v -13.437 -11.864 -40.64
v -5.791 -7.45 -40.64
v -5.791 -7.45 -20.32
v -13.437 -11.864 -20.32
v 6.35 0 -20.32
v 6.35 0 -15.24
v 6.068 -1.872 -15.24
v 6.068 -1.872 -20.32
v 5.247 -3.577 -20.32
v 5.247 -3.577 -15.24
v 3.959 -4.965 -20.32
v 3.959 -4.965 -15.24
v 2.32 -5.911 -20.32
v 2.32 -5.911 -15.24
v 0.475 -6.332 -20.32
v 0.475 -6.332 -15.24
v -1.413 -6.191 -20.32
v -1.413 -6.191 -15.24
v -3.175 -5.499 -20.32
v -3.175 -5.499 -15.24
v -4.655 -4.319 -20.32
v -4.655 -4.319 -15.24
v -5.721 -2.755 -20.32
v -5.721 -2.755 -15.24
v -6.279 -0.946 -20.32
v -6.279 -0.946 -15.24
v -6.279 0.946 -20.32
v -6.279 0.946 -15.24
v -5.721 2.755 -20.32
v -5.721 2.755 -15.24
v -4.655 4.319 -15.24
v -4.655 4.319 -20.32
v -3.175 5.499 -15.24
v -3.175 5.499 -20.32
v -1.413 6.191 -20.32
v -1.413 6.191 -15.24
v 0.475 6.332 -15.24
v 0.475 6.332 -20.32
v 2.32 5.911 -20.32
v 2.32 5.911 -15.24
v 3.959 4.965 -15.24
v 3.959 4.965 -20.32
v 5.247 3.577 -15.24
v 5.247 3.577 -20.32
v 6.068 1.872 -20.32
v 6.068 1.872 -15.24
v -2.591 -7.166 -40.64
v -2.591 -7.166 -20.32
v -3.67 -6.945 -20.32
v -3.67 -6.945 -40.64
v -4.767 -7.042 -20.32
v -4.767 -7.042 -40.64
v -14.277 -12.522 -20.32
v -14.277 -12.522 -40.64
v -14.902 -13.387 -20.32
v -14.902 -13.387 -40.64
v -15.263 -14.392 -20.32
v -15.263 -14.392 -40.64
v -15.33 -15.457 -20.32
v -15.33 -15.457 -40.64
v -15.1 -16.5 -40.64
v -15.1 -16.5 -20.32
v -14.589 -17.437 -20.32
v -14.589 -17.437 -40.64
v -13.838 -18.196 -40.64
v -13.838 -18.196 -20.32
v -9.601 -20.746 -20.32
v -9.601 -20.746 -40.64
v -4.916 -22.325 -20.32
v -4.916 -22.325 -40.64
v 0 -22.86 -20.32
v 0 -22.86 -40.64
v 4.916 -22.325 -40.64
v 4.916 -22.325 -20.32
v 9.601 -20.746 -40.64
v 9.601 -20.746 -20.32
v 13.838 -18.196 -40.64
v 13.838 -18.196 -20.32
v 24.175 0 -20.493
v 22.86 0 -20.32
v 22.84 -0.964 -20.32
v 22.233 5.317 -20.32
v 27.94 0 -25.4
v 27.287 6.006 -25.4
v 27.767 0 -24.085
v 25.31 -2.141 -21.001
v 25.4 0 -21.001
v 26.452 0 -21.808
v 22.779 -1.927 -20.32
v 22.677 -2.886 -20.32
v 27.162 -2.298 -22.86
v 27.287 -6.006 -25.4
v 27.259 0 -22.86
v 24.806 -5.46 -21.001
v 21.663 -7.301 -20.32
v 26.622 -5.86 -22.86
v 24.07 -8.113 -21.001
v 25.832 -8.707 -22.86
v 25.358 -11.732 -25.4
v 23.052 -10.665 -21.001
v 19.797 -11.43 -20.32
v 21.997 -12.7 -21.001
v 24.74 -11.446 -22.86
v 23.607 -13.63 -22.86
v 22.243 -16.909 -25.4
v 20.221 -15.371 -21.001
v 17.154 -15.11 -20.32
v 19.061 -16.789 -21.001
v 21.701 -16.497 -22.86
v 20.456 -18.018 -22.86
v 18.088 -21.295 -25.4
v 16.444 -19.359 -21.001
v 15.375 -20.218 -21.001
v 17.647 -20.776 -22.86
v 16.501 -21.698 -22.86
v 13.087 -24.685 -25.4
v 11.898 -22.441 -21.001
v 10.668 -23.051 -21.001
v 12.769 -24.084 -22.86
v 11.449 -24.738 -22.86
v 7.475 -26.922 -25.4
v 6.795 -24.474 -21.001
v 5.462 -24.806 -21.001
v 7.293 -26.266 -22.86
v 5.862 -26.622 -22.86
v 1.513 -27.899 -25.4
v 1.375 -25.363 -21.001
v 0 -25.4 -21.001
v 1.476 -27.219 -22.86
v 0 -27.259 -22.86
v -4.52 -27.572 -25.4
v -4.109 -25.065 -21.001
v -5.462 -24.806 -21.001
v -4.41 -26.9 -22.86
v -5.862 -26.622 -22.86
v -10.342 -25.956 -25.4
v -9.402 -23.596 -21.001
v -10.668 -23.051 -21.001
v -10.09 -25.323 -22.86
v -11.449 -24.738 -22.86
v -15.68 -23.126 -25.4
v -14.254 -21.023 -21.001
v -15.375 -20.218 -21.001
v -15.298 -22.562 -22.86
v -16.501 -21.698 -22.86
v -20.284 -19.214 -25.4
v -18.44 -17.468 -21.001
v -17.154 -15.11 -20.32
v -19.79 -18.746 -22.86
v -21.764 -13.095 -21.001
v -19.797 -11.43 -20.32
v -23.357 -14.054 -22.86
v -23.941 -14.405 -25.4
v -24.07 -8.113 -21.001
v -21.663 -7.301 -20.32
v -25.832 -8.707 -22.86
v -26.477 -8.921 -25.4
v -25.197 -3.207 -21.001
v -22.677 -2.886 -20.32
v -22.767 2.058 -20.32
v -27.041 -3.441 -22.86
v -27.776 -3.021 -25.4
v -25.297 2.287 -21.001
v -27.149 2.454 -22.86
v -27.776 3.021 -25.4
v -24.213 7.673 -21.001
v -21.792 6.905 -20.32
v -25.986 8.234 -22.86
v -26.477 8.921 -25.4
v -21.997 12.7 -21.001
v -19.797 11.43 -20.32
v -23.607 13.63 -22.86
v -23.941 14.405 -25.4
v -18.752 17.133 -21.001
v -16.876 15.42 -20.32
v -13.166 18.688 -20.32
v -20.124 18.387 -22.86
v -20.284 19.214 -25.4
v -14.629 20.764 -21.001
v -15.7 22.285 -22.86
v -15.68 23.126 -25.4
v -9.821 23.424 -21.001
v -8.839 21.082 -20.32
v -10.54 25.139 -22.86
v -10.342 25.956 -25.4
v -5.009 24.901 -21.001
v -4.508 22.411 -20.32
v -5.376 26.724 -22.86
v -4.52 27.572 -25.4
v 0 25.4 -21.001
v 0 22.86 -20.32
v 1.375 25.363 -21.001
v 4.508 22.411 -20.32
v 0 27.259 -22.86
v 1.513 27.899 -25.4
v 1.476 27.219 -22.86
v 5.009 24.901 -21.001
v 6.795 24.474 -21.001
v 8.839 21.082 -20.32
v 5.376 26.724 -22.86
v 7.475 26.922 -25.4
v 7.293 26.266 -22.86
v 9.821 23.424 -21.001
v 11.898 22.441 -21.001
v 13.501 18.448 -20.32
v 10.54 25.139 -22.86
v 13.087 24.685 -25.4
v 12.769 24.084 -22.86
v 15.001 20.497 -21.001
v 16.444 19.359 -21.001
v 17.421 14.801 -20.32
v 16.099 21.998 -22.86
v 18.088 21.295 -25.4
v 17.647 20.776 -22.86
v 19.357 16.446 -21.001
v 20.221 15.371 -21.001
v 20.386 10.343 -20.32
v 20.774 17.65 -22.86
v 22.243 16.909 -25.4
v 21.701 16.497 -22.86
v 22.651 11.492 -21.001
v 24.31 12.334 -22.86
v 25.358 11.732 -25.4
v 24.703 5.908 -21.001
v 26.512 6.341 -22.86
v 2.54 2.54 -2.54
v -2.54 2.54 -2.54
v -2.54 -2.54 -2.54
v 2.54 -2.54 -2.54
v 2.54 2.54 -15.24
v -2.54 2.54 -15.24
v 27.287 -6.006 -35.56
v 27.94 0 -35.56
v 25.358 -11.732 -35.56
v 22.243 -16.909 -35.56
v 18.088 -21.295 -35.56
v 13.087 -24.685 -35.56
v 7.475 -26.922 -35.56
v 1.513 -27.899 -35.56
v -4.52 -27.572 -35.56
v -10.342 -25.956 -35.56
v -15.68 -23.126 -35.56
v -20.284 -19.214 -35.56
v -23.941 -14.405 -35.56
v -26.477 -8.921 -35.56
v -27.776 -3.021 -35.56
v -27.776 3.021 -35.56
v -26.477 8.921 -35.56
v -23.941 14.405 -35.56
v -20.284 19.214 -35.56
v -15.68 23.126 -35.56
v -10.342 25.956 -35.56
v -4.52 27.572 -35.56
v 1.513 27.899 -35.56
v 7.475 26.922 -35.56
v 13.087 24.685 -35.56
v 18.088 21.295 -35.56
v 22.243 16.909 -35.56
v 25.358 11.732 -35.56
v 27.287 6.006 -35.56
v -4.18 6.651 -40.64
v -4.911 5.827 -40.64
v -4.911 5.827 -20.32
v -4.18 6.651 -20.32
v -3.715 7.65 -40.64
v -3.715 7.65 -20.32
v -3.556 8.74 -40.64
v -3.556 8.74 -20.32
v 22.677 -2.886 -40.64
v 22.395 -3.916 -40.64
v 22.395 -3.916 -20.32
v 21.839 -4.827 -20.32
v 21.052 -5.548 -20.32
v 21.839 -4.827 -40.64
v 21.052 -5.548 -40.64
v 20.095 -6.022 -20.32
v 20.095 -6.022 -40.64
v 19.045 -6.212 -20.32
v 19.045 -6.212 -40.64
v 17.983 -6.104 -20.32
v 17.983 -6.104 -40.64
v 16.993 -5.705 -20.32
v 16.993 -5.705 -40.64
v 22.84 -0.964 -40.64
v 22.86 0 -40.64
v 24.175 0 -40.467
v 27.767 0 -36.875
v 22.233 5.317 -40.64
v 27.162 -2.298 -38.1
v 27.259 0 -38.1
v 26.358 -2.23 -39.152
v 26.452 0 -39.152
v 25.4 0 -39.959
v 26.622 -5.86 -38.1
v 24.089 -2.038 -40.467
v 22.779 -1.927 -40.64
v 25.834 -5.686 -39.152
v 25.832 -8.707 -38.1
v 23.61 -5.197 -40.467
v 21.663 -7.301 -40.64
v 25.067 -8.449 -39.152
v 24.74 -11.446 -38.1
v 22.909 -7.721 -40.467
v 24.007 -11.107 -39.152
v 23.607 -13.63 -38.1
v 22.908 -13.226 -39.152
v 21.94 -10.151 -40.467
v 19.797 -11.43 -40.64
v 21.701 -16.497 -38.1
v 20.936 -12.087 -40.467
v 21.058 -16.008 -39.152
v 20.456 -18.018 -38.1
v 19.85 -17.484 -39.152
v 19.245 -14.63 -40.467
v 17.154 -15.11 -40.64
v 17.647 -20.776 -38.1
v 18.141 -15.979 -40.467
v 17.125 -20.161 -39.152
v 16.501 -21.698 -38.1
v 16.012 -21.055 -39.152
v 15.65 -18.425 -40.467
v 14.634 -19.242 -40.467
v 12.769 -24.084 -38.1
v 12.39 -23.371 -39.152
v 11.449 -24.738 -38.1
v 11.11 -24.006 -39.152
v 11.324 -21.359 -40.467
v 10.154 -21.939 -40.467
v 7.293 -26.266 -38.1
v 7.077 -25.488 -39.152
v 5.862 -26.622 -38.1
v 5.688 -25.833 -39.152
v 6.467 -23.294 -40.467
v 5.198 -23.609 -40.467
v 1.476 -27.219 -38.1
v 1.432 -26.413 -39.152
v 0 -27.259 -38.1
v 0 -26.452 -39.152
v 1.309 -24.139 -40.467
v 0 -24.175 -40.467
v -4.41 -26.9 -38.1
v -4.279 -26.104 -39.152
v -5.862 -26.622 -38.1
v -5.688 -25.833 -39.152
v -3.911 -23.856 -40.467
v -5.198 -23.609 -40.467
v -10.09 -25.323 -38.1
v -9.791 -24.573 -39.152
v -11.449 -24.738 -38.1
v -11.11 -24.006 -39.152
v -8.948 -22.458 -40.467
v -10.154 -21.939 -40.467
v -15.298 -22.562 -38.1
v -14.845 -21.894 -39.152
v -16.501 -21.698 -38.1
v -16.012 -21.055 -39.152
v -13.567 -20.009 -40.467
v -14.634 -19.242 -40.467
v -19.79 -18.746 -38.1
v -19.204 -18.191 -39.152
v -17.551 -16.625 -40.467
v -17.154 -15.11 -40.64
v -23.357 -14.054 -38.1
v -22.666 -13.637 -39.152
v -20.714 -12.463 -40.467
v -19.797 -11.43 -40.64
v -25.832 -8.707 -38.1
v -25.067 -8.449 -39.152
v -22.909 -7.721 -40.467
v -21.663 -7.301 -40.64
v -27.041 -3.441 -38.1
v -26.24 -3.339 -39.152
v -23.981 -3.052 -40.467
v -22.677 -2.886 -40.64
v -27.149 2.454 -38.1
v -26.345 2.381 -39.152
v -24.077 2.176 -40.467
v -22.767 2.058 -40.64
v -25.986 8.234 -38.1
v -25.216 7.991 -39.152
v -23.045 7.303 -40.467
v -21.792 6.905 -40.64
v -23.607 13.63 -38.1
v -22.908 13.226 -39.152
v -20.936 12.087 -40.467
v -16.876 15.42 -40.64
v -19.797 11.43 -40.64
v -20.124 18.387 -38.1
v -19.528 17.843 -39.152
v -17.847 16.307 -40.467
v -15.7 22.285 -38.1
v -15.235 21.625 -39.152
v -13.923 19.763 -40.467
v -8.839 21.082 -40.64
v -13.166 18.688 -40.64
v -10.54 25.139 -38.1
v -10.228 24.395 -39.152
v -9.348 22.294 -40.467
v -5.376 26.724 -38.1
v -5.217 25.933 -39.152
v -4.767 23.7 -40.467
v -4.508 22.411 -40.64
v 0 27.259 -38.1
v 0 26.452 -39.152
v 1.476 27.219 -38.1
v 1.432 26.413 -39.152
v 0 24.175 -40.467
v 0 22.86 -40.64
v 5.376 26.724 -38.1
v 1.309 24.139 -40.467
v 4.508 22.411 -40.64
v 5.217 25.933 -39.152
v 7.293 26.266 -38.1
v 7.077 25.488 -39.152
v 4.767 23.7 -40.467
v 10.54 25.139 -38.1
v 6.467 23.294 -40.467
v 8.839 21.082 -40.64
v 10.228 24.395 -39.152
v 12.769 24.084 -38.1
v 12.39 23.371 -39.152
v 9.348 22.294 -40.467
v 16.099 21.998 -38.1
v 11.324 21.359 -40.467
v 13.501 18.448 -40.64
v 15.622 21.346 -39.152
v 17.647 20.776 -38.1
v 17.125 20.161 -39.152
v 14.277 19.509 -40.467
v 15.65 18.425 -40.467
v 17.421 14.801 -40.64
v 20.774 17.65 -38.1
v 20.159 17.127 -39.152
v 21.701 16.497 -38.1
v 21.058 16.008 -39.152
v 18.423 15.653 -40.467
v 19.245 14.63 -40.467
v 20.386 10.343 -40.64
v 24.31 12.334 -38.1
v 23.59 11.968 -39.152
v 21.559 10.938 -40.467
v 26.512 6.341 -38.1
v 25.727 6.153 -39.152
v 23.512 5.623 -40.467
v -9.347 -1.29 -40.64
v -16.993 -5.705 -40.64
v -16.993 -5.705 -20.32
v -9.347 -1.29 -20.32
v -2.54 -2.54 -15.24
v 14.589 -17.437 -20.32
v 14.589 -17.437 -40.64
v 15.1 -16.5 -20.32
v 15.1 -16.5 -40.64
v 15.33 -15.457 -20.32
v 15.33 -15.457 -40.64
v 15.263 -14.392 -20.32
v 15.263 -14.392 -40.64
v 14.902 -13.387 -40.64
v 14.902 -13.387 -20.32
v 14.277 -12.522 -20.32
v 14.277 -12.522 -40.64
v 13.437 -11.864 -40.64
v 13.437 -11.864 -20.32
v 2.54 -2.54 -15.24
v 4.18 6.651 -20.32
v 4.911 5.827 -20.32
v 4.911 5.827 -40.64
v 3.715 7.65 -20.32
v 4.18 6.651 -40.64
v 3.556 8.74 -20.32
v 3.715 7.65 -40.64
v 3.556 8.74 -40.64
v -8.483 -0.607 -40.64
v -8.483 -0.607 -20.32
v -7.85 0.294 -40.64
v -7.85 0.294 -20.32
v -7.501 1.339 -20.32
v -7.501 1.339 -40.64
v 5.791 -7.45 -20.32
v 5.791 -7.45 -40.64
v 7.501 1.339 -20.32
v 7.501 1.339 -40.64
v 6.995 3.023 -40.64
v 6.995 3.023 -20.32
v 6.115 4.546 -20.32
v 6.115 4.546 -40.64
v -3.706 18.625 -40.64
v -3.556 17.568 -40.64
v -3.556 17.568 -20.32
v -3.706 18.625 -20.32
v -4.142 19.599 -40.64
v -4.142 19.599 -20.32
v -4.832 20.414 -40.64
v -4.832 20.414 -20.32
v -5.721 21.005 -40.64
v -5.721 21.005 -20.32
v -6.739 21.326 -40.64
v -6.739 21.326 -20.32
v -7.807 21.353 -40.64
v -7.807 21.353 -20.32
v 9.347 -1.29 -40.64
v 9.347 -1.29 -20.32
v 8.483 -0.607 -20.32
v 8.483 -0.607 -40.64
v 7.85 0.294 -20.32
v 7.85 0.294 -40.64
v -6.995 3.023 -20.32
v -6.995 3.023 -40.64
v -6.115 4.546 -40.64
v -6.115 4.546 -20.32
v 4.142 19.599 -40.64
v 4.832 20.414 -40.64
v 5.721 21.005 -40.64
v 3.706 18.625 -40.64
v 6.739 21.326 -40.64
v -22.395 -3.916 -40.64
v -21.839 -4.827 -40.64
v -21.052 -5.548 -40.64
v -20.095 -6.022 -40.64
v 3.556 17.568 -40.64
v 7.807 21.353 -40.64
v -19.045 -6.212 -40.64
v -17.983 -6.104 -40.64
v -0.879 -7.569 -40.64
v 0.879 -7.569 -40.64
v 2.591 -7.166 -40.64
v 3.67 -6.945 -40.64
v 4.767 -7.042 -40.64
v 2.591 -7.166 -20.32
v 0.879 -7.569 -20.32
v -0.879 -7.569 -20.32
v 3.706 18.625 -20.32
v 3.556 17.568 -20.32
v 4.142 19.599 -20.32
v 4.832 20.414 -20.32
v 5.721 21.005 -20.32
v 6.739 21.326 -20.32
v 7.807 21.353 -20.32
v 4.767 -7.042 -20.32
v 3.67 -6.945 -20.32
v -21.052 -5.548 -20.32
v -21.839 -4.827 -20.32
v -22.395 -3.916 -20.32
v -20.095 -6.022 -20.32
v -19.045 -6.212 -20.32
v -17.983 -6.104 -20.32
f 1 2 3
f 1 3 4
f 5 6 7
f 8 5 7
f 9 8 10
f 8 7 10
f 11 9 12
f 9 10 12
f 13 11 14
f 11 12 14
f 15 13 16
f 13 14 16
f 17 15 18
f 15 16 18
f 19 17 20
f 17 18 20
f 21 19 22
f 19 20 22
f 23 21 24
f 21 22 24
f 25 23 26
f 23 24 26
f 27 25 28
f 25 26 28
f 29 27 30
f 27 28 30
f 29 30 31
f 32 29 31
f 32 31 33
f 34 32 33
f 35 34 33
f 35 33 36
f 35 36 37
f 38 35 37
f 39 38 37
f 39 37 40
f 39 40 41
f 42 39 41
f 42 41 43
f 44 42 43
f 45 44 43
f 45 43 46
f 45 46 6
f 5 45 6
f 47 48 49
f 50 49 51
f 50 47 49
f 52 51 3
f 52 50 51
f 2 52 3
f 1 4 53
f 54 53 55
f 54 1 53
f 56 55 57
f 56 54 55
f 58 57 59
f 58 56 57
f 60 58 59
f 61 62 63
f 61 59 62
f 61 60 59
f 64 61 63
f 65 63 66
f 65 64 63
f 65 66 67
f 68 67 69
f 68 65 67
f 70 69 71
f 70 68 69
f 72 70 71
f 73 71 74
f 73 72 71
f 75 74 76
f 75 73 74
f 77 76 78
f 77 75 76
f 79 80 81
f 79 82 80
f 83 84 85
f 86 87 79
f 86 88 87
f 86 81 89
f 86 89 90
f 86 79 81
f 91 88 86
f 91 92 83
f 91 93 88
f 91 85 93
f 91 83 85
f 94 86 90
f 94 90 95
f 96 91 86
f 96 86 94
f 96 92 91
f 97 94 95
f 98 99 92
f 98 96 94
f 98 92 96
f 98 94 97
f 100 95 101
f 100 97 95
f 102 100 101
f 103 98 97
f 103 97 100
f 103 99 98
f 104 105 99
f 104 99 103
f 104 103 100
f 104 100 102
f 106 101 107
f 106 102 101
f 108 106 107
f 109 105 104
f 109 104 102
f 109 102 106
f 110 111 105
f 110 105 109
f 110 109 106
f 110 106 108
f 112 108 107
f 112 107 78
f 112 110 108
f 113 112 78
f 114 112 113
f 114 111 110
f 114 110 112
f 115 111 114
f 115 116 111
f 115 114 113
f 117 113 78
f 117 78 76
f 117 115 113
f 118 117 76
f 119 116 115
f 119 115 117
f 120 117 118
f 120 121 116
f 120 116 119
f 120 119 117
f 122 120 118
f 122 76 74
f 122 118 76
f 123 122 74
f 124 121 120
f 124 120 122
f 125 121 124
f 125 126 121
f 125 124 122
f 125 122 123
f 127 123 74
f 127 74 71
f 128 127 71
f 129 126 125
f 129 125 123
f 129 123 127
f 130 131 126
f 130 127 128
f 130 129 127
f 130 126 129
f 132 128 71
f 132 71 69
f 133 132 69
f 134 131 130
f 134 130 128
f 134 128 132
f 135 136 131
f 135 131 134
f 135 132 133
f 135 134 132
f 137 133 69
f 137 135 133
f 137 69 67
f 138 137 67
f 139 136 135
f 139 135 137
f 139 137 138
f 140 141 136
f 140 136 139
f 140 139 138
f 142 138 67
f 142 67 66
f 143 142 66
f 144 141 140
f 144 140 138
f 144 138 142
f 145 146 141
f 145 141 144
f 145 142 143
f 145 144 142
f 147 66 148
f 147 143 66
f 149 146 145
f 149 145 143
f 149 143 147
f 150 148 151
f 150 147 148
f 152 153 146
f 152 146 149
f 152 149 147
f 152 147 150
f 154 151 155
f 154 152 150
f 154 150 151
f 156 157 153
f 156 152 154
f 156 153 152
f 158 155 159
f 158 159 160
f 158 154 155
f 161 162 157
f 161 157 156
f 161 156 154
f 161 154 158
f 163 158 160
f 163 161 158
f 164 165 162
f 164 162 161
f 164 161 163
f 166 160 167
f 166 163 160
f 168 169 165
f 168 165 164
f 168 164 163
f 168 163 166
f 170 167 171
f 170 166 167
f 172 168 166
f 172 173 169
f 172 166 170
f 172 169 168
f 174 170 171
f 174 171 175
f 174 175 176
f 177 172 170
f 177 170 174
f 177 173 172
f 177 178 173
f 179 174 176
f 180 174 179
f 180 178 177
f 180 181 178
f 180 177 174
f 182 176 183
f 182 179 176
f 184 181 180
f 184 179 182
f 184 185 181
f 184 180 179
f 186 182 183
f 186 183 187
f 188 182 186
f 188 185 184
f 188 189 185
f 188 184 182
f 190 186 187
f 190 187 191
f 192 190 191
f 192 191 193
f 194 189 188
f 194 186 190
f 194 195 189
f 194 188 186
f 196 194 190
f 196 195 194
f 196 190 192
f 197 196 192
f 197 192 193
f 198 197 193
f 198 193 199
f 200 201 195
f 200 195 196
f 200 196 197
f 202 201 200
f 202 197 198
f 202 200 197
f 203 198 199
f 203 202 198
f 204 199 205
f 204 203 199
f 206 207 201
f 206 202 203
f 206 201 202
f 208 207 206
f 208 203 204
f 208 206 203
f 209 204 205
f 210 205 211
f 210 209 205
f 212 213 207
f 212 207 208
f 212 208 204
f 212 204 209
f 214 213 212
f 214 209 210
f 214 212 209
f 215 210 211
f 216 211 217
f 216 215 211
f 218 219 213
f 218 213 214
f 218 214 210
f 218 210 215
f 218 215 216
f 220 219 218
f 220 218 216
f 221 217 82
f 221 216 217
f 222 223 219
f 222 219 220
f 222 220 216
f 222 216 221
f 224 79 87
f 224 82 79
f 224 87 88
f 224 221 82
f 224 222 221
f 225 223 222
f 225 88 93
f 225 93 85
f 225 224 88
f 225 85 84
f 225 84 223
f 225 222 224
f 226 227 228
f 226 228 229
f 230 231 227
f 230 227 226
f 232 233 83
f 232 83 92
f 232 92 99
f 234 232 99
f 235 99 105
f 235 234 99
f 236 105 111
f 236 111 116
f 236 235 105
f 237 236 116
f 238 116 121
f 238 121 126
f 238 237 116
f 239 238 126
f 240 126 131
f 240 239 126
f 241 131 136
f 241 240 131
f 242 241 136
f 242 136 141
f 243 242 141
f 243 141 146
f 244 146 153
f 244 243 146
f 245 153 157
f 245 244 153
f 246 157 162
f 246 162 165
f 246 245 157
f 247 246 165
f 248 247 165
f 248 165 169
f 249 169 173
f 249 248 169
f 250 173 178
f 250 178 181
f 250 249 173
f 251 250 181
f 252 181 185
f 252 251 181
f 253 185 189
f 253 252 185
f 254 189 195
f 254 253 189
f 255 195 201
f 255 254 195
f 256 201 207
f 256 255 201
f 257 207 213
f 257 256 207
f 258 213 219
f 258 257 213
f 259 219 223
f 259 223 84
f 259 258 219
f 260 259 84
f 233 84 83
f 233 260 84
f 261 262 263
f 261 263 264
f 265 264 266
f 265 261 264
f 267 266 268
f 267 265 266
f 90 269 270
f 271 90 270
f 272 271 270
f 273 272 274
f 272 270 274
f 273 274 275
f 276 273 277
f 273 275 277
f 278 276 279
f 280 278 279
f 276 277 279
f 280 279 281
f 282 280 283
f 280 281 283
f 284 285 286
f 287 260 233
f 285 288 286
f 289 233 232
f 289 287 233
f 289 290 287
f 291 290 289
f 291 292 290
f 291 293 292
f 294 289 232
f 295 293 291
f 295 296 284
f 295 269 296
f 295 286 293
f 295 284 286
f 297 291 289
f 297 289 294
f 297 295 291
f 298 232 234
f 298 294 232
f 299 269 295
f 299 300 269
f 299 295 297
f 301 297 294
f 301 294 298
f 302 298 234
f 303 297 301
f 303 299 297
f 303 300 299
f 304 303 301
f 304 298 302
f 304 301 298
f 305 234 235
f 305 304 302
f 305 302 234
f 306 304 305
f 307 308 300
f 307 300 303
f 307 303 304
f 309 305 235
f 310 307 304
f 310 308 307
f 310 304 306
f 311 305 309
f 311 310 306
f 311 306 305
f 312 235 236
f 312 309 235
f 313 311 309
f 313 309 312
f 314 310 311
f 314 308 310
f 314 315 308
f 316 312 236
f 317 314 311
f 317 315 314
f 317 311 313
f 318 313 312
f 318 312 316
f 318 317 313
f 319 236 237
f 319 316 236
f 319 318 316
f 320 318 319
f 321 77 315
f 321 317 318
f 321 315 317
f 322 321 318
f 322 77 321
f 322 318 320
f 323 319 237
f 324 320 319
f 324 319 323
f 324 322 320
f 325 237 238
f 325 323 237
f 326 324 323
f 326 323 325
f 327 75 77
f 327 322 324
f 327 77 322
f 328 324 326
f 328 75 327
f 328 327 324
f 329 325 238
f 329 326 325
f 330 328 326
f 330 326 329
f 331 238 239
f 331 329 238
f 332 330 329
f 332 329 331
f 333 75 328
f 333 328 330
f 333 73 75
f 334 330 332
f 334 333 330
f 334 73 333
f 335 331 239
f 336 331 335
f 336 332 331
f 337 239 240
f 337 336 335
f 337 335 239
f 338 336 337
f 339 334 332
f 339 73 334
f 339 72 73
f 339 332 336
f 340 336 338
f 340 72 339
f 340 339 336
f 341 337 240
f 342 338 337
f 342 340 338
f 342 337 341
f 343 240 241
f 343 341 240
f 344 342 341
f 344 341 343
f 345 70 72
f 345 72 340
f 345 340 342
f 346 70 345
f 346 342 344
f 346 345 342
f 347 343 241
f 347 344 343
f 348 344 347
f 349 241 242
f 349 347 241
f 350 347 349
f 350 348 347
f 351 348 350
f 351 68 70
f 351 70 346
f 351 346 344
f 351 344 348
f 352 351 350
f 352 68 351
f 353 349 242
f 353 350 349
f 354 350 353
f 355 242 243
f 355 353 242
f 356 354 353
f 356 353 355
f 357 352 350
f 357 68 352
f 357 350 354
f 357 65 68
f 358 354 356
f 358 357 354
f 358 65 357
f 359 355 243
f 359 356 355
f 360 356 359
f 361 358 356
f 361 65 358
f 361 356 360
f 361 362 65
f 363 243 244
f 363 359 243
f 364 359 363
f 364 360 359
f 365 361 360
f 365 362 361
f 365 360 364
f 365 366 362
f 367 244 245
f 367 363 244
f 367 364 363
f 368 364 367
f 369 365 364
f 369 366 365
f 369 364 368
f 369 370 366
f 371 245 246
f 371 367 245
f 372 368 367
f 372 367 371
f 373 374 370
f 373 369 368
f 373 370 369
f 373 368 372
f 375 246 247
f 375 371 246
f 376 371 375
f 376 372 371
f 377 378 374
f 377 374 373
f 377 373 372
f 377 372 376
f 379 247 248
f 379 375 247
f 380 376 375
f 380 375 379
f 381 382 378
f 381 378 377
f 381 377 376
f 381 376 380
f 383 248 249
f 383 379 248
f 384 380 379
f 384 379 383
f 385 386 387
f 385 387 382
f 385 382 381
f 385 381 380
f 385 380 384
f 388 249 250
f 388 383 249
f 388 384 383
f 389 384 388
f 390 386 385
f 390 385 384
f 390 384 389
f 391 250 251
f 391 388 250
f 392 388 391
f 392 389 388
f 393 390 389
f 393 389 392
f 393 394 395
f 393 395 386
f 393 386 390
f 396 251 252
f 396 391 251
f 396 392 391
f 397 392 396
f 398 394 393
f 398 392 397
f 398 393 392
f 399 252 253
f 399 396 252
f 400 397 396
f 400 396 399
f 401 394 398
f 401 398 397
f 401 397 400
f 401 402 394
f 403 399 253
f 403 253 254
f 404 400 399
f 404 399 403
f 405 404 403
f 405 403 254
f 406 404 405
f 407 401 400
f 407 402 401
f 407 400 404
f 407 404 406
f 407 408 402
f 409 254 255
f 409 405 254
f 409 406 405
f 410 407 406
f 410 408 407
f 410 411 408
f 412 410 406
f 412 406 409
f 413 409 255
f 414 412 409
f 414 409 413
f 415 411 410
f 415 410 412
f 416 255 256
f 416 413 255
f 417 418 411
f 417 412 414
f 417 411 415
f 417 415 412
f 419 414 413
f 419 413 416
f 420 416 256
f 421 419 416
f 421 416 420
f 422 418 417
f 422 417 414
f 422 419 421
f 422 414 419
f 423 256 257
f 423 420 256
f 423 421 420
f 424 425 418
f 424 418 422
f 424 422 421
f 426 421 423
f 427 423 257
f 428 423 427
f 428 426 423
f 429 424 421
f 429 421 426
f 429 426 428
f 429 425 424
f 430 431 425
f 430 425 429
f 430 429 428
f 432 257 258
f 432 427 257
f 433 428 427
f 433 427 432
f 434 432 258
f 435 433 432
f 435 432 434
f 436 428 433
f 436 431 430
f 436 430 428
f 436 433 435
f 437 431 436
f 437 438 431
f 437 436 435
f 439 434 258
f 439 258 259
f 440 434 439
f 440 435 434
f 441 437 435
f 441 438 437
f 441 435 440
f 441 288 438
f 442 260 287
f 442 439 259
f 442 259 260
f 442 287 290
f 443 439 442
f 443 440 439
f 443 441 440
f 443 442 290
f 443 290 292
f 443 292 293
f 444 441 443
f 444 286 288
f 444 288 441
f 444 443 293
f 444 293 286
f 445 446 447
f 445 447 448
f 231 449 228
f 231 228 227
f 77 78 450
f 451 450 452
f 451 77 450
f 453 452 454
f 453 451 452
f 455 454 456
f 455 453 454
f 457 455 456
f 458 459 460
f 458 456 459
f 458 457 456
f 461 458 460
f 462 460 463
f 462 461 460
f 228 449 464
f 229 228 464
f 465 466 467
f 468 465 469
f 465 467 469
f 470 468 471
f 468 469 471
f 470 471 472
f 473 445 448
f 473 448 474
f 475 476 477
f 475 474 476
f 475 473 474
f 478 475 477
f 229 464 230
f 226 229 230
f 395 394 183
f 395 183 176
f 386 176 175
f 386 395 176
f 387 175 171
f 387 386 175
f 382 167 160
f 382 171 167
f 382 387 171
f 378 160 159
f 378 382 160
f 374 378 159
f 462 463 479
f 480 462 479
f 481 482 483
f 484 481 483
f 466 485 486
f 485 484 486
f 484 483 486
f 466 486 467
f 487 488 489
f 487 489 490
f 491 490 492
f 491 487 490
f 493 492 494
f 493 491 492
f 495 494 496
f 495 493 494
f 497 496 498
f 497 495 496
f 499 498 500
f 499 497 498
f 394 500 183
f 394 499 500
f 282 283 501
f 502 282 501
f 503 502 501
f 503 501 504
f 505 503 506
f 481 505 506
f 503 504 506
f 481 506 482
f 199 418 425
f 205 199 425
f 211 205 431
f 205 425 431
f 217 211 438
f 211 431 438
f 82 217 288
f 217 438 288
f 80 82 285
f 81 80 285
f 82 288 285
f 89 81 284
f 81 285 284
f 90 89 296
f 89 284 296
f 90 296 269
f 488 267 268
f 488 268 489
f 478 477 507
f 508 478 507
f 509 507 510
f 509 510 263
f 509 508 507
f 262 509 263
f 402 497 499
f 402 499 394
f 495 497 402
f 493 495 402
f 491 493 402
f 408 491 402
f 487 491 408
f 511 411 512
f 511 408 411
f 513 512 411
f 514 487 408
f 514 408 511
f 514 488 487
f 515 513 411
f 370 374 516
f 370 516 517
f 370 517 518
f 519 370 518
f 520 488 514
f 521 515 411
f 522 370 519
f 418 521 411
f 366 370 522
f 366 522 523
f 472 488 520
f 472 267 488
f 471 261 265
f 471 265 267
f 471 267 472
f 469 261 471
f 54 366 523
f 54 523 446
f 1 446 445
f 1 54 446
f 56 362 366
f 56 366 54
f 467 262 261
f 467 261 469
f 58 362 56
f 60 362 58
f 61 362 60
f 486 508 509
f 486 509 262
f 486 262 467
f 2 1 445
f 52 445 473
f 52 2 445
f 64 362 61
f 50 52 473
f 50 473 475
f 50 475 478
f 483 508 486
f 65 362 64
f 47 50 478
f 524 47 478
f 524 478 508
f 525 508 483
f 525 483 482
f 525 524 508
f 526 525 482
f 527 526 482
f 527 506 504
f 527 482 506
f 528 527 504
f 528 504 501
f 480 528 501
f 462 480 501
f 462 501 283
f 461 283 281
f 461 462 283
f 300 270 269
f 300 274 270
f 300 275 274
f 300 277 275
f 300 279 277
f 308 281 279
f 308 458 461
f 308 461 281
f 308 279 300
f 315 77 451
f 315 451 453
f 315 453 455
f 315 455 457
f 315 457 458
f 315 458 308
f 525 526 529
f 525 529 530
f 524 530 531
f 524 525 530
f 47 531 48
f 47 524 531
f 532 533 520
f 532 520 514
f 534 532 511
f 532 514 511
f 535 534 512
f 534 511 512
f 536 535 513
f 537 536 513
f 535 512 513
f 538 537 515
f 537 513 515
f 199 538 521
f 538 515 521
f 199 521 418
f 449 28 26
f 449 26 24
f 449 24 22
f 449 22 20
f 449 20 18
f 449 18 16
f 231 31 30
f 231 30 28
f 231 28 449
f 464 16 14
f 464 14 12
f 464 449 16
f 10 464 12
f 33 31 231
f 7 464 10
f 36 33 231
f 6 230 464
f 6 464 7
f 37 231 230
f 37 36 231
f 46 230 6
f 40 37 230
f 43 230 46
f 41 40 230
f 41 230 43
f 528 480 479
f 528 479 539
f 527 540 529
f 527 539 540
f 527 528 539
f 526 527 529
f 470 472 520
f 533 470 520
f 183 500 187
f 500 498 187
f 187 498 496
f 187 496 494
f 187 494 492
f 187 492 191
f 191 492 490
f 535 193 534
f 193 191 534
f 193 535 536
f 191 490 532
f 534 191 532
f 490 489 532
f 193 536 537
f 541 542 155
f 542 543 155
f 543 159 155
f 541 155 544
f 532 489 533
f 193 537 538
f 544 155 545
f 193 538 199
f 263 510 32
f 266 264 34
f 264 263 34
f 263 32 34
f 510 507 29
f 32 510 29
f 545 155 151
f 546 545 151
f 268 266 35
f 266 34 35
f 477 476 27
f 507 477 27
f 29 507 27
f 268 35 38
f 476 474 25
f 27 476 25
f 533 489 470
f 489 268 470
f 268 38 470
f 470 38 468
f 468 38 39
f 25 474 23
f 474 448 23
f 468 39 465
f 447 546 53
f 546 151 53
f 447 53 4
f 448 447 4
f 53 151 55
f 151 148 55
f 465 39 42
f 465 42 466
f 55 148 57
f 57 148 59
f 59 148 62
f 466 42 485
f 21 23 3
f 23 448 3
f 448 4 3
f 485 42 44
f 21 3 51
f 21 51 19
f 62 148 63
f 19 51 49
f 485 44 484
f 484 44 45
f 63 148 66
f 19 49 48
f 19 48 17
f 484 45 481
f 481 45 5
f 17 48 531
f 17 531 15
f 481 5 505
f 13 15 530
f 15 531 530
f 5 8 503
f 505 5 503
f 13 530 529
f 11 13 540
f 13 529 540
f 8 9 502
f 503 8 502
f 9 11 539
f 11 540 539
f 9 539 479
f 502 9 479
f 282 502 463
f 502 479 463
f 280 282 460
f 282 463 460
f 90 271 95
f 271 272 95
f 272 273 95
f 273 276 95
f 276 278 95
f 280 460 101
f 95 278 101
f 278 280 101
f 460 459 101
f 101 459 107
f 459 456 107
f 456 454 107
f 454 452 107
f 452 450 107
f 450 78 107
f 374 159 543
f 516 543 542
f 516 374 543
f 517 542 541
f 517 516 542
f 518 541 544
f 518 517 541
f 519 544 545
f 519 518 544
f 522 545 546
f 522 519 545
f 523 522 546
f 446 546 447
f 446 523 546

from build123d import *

# Parameters (mm, degrees)
SKETCH1_R           = 27.94
BOSS_EXTRUDE1_DEPTH = 20.32
SKETCH2_R           = 6.35
BOSS_EXTRUDE2_DEPTH = 20.32
BOSS_EXTRUDE3_START = 20.32
SKETCH3_R           = 27.94
BOSS_EXTRUDE3_DEPTH = 20.32
FILLET1_R           = 5.08
FILLET2_R           = 5.08
FILLET3_R           = 5.08
FILLET4_R           = 5.08
CUT_EXTRUDE1_DEPTH  = 73.645776241
SKETCH6_R           = 27.94
CUT_EXTRUDE2_DEPTH  = 57.682420605
SKETCH7_R           = 6.35
CUT_EXTRUDE3_DEPTH  = 5.08
SKETCH9_R           = 6.35
CUT_EXTRUDE5_DEPTH  = 10.16
SKETCH10_W          = 5.08
SKETCH10_H          = 5.08
BOSS_EXTRUDE4_DEPTH = 12.7


with BuildPart() as part:
    # Sketch1 → Boss-Extrude1 (new body)
    with BuildSketch(Plane.XY):
        Circle(SKETCH1_R)
    extrude(amount=BOSS_EXTRUDE1_DEPTH)

    # Sketch2 → Boss-Extrude2 (add)
    with BuildSketch(Plane(origin=(0, 0, 0), x_dir=(-1, 0, 0), z_dir=(0, 0, -1))):
        with Locations(Location((0, 0, 0), (0, 0, 180))):
            Circle(SKETCH2_R)
    extrude(amount=BOSS_EXTRUDE2_DEPTH)

    # Sketch3 → Boss-Extrude3 (add)
    with BuildSketch(Plane(origin=(0, 0, -20.32), x_dir=(-1, 0, 0), z_dir=(0, 0, -1)).offset(BOSS_EXTRUDE3_START)):
        with Locations(Location((0, 0, 0), (0, 0, 180))):
            Circle(SKETCH3_R)
    extrude(amount=-BOSS_EXTRUDE3_DEPTH)

    # Fillet1
    fillet1_edges = [part.edges().sort_by_distance(p)[0] for p in [
        (-27.94, 0, 20.32),
    ]]
    fillet(fillet1_edges, radius=FILLET1_R)

    # Fillet2
    fillet2_edges = [part.edges().sort_by_distance(p)[0] for p in [
        (-27.94, 0, 0),
    ]]
    fillet(fillet2_edges, radius=FILLET2_R)

    # Fillet3
    fillet3_edges = [part.edges().sort_by_distance(p)[0] for p in [
        (-27.94, 0, -20.32),
    ]]
    fillet(fillet3_edges, radius=FILLET3_R)

    # Fillet4
    fillet4_edges = [part.edges().sort_by_distance(p)[0] for p in [
        (-27.94, 0, -40.64),
    ]]
    fillet(fillet4_edges, radius=FILLET4_R)

    # Sketch4 → Cut-Extrude1 (cut, through all)
    with BuildSketch(Plane(origin=(0, 0, -40.64), x_dir=(-1, 0, 0), z_dir=(0, 0, -1))):
        with BuildLine():
            Line((-3.556, 8.739962471), (-3.556, 17.568282329))
            ThreePointArc((-3.556, 17.568282329), (-5.256117539, 20.740741312), (-8.8392, 21.081938795))
            ThreePointArc((-8.8392, 21.081938795), (-19.797340731, 11.43), (-22.677094558, -2.885997648))
            ThreePointArc((-22.677094558, -2.885997648), (-20.590067639, -5.818439342), (-16.992578798, -5.704554829))
            Line((-16.992578798, -5.704554829), (-9.347029528, -1.2903949))
            ThreePointArc((-9.347029528, -1.2903949), (-8.133427478, -0.179541209), (-7.501353019, 1.339441259))
            ThreePointArc((-7.501353019, 1.339441259), (-6.599113577, 3.81), (-4.910666667, 5.826641648))
            ThreePointArc((-4.910666667, 5.826641648), (-3.911226491, 7.13352542), (-3.556, 8.739962471))
        make_face()
        with BuildLine():
            Line((3.556, 8.739962471), (3.556, 17.568282329))
            ThreePointArc((3.556, 17.568282329), (5.256117539, 20.740741312), (8.8392, 21.081938795))
            ThreePointArc((8.8392, 21.081938795), (19.797340731, 11.43), (22.677094558, -2.885997648))
            ThreePointArc((22.677094558, -2.885997648), (20.590067639, -5.818439342), (16.992578798, -5.704554829))
            Line((16.992578798, -5.704554829), (9.347029528, -1.2903949))
            ThreePointArc((9.347029528, -1.2903949), (8.133427478, -0.179541209), (7.501353019, 1.339441259))
            ThreePointArc((7.501353019, 1.339441259), (6.599113577, 3.81), (4.910666667, 5.826641648))
            ThreePointArc((4.910666667, 5.826641648), (3.911226491, 7.13352542), (3.556, 8.739962471))
        make_face()
        with BuildLine():
            Line((5.791029528, -7.449567572), (13.436578798, -11.8637275))
            ThreePointArc((13.436578798, -11.8637275), (15.3339501, -14.92230197), (13.837894558, -18.195941147))
            ThreePointArc((13.837894558, -18.195941147), (0, -22.86), (-13.837894558, -18.195941147))
            ThreePointArc((-13.837894558, -18.195941147), (-15.3339501, -14.92230197), (-13.436578798, -11.8637275))
            Line((-13.436578798, -11.8637275), (-5.791029528, -7.449567572))
            ThreePointArc((-5.791029528, -7.449567572), (-4.222200987, -6.953984211), (-2.590686352, -7.166082907))
            ThreePointArc((-2.590686352, -7.166082907), (0, -7.62), (2.590686352, -7.166082907))
            ThreePointArc((2.590686352, -7.166082907), (4.222200987, -6.953984211), (5.791029528, -7.449567572))
        make_face()
    extrude(amount=-CUT_EXTRUDE1_DEPTH, mode=Mode.SUBTRACT)

    # Sketch6 → Cut-Extrude2 (cut, through all)
    with BuildSketch(Plane(origin=(0, 0, 0), x_dir=(-1, 0, 0), z_dir=(0, 0, -1))):
        Circle(SKETCH6_R)
    extrude(amount=-CUT_EXTRUDE2_DEPTH, mode=Mode.SUBTRACT)

    # Sketch7 → Cut-Extrude3 (cut)
    with BuildSketch(Plane.XY):
        Circle(SKETCH7_R)
    extrude(amount=-CUT_EXTRUDE3_DEPTH, mode=Mode.SUBTRACT)

    # Sketch9 → Cut-Extrude5 (cut)
    with BuildSketch(Plane.XY.offset(-5.08)):
        Circle(SKETCH9_R)
    extrude(amount=-CUT_EXTRUDE5_DEPTH, mode=Mode.SUBTRACT)

    # Sketch10 → Boss-Extrude4 (add)
    with BuildSketch(Plane.XY.offset(-15.24)):
        Rectangle(SKETCH10_W, SKETCH10_H)
    extrude(amount=BOSS_EXTRUDE4_DEPTH)


solid = part.part
